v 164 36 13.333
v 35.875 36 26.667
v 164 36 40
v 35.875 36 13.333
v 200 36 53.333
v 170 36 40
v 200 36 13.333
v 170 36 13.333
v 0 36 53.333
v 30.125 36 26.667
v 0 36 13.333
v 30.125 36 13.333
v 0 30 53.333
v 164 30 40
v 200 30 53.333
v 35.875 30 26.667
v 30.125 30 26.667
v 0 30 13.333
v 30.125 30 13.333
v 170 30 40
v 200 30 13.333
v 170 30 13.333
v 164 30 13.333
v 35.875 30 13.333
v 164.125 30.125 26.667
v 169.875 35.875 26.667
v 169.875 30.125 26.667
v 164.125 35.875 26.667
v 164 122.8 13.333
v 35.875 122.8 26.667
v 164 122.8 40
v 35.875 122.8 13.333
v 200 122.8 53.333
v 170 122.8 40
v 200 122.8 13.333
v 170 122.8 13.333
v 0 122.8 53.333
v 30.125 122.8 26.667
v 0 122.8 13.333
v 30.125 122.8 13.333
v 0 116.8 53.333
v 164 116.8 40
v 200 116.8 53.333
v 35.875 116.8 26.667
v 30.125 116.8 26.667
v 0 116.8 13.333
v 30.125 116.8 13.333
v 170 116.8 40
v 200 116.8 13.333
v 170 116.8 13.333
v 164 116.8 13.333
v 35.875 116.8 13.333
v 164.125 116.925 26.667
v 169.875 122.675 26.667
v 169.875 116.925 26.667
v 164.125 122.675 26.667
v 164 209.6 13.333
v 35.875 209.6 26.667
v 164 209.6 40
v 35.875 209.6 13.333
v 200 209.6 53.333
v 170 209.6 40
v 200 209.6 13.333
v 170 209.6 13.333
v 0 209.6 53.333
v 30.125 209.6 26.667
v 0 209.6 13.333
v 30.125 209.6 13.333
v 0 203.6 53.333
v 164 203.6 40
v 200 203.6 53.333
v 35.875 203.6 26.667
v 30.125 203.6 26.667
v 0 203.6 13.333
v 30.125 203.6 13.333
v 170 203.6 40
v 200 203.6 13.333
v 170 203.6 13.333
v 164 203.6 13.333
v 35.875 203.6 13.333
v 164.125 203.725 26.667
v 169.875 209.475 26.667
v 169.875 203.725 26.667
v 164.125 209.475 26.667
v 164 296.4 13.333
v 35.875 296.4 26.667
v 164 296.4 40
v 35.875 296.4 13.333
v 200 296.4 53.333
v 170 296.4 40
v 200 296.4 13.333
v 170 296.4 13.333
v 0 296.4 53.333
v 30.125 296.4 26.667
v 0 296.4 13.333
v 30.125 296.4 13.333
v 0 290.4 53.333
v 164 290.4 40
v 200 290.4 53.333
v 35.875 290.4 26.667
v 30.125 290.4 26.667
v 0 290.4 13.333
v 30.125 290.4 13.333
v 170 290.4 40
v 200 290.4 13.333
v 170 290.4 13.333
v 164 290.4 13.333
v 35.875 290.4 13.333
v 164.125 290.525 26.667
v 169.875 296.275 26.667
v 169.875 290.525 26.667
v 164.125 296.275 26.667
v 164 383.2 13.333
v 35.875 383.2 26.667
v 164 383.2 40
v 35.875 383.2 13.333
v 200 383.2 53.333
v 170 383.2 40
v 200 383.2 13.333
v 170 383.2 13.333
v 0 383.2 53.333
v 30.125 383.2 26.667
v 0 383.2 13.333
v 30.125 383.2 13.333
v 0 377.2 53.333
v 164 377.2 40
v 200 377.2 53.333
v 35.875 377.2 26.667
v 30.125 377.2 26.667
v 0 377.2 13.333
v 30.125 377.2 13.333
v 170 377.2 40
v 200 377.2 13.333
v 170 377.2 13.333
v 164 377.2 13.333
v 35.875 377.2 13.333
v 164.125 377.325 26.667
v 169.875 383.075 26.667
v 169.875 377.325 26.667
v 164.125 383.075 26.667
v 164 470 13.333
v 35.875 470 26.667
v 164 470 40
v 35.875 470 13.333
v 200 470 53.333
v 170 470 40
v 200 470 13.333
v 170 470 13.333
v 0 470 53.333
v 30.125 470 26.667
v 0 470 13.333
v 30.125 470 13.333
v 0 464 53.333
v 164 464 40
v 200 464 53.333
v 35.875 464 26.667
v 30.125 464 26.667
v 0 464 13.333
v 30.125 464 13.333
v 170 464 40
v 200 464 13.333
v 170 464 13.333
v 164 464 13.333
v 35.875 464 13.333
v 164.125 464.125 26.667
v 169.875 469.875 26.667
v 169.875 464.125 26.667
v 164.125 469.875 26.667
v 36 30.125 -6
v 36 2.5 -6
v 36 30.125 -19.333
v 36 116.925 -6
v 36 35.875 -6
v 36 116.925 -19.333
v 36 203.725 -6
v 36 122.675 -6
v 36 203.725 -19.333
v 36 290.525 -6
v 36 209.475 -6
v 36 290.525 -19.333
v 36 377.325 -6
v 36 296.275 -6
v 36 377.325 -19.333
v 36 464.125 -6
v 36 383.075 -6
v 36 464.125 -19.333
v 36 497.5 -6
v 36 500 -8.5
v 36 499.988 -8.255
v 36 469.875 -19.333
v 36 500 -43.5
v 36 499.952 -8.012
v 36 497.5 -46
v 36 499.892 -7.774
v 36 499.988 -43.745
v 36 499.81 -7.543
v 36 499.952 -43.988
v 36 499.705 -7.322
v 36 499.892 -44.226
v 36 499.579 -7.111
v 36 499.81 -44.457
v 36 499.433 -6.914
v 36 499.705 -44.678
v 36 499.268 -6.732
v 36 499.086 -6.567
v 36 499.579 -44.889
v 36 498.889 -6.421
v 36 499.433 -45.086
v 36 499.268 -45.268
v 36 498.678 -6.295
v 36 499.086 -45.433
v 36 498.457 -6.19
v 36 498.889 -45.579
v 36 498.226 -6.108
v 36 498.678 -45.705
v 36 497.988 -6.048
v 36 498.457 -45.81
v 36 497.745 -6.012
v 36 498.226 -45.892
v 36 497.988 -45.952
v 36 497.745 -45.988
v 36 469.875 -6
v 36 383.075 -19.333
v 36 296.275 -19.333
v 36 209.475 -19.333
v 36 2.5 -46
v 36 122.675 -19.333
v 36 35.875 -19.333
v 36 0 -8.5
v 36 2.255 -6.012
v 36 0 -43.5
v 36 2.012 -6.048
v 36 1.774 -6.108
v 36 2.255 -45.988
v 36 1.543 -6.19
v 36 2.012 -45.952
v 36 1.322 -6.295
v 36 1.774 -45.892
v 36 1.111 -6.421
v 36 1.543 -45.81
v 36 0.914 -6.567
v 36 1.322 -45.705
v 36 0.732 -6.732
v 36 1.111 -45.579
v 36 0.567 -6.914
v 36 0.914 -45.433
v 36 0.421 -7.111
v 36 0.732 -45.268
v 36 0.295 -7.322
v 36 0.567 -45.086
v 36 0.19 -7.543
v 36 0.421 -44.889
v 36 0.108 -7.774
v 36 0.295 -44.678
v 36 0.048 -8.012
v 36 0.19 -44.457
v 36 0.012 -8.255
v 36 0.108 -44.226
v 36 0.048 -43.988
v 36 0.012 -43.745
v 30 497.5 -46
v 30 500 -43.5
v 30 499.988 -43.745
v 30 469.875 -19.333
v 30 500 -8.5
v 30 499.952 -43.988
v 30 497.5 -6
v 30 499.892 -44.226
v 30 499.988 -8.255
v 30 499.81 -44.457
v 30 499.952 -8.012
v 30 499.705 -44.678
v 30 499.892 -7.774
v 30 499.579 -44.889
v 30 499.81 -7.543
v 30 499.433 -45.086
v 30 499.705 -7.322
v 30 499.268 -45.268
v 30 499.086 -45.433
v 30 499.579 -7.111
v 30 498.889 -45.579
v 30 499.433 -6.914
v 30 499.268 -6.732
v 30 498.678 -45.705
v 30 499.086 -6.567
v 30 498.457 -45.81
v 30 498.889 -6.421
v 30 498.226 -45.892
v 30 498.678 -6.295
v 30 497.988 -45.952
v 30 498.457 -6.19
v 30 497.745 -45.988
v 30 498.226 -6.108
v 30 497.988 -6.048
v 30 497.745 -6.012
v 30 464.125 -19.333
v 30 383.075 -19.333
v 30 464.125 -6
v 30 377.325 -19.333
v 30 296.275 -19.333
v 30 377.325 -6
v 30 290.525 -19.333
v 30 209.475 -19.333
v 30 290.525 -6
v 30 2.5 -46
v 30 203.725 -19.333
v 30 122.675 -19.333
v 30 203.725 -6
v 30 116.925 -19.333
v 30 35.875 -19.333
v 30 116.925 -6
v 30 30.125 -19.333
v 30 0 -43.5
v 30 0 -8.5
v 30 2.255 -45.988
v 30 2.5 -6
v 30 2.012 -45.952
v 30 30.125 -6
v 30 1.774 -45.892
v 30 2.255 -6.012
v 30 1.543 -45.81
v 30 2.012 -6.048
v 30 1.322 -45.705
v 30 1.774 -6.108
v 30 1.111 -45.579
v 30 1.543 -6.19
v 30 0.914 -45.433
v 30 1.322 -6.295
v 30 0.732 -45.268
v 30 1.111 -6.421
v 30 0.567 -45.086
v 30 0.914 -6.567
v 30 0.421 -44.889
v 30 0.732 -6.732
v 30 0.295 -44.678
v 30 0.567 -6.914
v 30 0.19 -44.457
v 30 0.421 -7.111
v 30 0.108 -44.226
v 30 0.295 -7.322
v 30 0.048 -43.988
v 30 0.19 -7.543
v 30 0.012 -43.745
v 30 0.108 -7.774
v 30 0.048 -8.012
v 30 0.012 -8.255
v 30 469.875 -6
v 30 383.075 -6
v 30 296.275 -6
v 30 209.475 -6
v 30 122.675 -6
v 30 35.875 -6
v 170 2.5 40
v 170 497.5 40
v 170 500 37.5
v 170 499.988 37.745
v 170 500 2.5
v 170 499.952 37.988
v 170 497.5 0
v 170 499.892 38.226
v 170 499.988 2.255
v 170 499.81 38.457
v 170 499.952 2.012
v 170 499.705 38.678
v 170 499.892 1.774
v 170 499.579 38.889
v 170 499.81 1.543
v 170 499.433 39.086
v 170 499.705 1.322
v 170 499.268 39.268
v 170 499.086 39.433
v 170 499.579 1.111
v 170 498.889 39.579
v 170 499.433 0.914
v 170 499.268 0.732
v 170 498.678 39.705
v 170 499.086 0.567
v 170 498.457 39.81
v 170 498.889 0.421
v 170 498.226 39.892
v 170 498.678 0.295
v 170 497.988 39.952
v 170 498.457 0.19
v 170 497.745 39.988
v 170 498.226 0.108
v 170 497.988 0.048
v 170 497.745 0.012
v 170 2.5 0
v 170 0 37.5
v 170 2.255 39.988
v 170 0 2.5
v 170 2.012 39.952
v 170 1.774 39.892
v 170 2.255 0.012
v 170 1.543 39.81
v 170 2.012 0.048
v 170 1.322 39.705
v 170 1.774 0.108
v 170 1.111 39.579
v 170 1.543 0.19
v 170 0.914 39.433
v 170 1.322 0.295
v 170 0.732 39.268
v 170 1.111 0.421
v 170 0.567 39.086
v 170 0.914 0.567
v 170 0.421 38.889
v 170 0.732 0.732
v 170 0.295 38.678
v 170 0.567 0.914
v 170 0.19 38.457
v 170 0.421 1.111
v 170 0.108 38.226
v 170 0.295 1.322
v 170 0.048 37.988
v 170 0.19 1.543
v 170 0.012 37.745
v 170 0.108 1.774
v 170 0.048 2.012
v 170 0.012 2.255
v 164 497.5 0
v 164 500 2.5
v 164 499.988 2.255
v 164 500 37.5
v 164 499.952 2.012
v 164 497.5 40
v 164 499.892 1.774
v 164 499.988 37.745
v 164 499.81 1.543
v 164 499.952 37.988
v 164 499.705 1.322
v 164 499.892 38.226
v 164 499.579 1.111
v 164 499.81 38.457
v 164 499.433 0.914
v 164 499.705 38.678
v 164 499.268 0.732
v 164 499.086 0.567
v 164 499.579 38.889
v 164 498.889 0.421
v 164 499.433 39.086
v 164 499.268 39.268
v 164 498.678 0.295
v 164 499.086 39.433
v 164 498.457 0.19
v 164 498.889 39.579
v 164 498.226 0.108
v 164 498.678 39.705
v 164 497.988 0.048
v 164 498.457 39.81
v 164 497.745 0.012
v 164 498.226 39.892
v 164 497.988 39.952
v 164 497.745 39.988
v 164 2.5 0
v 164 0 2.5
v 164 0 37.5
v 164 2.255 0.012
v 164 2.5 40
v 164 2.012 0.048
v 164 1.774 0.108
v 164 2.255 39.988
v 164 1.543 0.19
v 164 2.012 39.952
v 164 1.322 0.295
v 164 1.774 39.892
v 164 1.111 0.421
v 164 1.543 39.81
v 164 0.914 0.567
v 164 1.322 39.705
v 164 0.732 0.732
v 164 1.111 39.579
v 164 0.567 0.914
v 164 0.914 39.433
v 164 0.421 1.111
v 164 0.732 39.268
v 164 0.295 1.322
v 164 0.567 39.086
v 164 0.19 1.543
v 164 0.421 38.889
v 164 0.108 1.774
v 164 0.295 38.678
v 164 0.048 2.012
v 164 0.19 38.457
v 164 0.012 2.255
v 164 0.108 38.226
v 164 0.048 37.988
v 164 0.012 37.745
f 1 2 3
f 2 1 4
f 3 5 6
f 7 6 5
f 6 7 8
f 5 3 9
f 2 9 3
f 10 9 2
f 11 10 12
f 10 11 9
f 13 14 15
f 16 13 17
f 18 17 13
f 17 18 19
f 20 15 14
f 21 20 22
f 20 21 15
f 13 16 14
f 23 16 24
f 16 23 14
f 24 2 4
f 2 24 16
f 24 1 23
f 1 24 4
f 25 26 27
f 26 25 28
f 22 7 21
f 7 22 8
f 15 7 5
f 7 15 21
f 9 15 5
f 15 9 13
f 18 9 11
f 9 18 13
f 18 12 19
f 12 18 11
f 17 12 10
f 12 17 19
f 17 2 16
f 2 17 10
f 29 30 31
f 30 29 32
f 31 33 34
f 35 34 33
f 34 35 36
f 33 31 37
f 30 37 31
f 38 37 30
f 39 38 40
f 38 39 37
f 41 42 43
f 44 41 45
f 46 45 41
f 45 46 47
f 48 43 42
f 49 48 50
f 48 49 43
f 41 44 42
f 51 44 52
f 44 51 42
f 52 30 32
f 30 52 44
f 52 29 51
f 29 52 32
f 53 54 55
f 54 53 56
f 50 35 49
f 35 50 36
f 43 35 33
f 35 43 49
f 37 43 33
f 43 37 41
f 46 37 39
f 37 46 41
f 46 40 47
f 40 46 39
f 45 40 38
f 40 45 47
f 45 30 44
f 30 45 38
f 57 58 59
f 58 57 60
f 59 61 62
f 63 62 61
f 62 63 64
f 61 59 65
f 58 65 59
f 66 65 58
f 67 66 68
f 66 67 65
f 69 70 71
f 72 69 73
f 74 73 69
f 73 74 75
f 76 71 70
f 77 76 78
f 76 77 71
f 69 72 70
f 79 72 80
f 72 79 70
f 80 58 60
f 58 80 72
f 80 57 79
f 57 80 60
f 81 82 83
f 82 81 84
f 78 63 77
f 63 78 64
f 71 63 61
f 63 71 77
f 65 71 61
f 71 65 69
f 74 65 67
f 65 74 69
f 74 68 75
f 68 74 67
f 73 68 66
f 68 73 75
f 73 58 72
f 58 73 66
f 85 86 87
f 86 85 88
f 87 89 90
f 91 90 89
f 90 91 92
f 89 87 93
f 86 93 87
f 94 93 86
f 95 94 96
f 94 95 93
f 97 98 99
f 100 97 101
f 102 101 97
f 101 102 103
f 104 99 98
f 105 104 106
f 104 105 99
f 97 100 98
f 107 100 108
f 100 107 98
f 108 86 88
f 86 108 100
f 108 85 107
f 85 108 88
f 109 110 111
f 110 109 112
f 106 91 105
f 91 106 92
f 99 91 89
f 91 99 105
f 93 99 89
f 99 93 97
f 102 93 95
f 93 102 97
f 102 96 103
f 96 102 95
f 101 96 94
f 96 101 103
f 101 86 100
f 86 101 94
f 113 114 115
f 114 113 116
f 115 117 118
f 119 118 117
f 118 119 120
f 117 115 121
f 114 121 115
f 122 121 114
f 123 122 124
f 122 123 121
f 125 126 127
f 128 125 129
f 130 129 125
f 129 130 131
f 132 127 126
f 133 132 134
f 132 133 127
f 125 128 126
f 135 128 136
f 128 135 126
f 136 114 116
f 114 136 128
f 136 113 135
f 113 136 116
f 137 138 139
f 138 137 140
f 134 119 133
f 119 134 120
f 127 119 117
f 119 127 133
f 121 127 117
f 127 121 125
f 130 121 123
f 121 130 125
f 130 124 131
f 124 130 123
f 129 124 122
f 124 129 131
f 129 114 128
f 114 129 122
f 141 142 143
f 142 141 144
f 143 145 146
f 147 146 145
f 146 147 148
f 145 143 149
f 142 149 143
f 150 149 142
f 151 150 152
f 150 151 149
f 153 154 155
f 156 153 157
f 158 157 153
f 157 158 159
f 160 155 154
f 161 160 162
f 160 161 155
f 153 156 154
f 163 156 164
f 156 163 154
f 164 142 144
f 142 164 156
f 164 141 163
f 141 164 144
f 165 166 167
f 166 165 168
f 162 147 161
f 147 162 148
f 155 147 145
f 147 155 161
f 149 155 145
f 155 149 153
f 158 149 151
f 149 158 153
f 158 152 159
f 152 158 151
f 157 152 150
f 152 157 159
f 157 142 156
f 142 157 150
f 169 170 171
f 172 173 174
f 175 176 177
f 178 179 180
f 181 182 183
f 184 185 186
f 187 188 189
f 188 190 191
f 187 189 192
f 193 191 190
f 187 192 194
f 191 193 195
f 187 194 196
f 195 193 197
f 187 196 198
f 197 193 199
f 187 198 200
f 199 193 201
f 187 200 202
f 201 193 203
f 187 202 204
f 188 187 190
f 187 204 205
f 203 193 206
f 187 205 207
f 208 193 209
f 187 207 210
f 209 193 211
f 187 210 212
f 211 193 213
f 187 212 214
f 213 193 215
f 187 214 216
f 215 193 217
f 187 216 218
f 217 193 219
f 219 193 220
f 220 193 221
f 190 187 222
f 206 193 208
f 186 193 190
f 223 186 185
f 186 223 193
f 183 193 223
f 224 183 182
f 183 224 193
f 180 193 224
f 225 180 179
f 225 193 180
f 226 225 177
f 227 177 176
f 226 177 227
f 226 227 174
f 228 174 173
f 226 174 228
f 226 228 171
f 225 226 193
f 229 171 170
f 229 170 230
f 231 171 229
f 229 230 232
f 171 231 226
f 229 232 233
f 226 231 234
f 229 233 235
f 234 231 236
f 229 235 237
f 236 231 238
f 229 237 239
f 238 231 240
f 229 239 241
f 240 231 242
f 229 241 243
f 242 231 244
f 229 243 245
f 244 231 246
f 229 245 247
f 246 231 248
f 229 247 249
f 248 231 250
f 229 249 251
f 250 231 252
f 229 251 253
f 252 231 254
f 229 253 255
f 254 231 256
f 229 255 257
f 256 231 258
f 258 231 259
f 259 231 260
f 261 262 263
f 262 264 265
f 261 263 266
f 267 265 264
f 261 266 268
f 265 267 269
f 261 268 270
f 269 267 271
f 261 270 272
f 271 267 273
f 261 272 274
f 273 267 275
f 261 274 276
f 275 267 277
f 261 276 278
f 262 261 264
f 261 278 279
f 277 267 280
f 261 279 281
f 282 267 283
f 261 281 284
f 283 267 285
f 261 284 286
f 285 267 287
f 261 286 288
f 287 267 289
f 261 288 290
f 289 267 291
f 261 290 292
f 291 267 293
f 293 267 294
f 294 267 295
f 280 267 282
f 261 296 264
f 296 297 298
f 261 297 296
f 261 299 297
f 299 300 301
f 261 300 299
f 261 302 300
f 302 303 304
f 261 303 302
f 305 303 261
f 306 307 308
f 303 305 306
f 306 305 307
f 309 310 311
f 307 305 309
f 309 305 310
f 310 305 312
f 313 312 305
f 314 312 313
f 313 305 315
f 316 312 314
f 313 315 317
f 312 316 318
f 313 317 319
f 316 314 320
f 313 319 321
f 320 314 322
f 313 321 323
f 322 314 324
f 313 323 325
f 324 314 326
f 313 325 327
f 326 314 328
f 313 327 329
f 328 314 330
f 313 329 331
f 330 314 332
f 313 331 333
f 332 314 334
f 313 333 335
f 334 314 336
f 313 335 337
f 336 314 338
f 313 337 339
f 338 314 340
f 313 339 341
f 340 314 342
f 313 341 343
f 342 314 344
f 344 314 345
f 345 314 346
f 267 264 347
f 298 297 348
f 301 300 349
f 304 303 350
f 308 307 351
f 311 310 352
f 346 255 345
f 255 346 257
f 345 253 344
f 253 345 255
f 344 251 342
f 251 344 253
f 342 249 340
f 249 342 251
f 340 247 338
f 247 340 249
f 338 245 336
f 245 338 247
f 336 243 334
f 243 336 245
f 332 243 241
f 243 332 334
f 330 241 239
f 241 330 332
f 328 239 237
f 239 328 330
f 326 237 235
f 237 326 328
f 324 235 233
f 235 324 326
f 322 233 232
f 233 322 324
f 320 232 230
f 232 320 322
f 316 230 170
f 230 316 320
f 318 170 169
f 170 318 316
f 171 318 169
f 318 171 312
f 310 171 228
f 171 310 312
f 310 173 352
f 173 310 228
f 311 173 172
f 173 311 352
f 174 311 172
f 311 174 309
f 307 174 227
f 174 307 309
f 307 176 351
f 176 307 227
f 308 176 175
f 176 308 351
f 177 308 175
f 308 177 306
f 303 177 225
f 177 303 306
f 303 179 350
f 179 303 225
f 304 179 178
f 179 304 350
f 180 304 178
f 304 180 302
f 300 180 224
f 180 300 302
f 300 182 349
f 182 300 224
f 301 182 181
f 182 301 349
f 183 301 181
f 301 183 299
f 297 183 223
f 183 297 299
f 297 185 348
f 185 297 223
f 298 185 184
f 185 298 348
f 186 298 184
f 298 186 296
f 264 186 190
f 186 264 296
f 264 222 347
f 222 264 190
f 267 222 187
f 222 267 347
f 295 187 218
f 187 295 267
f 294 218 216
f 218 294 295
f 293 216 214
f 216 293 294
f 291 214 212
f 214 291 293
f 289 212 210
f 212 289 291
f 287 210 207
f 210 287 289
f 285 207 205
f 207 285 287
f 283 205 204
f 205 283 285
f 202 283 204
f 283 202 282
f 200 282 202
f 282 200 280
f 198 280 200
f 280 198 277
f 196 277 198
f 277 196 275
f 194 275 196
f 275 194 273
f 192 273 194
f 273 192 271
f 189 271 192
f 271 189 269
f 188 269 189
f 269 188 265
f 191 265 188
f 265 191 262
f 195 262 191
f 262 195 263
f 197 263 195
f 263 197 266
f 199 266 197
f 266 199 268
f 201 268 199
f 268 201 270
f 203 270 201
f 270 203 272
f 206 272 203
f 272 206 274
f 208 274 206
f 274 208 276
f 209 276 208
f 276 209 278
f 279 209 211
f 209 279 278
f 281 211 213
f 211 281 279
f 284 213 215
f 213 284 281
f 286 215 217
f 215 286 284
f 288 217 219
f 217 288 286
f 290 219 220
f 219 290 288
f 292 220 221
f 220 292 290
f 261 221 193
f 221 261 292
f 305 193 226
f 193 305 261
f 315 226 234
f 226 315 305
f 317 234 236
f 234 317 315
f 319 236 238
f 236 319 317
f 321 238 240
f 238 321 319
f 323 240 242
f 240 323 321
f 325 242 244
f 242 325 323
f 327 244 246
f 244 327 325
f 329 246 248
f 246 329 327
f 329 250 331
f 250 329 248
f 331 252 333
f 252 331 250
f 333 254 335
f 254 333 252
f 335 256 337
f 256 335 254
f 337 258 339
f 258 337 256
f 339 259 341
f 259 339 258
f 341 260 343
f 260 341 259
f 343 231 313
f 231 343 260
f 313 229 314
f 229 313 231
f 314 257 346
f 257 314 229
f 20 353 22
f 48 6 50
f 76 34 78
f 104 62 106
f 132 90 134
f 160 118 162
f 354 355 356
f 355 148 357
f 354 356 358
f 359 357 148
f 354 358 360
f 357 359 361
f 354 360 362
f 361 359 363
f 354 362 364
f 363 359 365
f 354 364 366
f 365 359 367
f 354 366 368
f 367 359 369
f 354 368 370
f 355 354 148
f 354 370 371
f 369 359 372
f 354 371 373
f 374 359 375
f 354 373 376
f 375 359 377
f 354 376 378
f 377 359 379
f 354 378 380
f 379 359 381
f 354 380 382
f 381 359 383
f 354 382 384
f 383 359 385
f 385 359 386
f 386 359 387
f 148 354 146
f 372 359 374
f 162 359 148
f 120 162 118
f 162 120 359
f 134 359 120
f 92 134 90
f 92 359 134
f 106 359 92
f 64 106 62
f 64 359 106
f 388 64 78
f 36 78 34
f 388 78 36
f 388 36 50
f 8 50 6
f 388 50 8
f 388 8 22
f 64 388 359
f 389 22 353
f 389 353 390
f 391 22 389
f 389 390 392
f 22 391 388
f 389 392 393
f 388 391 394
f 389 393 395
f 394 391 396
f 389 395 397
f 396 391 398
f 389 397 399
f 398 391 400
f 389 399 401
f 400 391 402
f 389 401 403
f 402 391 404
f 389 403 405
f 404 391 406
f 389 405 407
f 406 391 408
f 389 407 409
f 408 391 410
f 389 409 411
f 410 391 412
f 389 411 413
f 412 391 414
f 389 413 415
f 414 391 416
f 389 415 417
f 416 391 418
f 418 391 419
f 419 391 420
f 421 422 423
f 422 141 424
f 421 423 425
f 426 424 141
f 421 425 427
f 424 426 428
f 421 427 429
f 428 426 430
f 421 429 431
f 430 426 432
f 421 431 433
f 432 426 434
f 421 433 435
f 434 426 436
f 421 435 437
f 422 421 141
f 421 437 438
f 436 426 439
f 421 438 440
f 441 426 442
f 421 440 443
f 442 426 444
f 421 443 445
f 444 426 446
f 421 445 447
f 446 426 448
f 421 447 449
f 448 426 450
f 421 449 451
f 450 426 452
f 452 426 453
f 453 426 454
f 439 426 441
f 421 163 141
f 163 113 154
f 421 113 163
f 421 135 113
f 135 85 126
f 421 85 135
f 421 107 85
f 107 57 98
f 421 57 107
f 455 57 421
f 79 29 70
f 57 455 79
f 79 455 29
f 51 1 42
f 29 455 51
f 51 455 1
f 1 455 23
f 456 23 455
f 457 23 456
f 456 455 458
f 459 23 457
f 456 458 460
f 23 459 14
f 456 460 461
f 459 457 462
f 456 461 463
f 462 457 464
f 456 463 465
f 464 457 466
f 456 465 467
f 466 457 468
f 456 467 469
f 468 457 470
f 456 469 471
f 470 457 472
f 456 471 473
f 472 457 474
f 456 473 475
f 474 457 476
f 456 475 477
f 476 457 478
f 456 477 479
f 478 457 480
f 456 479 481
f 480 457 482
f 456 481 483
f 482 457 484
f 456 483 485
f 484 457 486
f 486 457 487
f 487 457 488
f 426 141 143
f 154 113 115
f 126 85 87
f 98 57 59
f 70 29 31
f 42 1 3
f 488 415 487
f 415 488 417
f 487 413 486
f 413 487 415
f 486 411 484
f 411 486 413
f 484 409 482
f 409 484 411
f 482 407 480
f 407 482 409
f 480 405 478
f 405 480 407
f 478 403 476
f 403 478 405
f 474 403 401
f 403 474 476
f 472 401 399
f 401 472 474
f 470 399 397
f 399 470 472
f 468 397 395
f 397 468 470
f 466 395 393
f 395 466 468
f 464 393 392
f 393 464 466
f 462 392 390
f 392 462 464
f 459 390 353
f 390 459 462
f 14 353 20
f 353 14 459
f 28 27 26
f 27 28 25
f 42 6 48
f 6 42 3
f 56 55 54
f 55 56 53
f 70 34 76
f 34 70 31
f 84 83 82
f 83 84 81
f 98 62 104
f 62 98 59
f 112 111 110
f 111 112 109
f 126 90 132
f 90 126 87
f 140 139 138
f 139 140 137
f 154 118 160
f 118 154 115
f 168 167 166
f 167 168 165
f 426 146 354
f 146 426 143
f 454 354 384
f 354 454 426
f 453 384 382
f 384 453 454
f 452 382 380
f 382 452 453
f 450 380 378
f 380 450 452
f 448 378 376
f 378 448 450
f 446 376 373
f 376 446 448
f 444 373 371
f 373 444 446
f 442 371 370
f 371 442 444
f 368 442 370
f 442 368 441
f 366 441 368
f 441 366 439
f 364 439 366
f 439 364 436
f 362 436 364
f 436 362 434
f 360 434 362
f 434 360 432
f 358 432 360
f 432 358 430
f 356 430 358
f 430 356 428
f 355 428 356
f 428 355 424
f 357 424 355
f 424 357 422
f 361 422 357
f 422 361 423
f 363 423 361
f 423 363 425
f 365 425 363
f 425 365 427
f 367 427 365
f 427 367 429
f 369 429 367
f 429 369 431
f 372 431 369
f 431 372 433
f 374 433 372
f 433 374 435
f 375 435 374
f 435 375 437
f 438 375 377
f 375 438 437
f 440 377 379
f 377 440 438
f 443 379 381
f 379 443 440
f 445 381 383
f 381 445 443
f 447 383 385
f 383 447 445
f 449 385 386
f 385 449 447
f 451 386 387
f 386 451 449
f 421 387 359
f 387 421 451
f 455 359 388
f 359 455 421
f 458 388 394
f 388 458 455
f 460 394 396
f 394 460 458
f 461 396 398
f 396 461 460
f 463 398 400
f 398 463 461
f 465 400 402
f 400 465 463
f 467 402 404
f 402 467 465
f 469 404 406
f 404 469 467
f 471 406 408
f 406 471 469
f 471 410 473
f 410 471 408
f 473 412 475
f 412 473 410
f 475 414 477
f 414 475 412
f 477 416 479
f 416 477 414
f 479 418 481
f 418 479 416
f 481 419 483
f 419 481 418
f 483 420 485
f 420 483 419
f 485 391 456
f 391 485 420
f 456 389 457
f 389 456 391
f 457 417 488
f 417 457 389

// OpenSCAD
width = 200;
length = 500;
height = 40;

//materialstärke
th = 6;

// Anzahl Querverbindungen
anz = 6;

// Abstand Überkreuzung
margin = 30;

// Toleranzkorrektur
tol = 0.25; 

// Radius für Rundung
rad = 5;


// Schnitttiefe. zB.: height/2
cutDepth = height/3;

// Vorschau
!preview();

// Schnittansicht
renderview();


// Testück
test();




// ===========================================================
$fn = 64;
red = [1,0,0];
green = [0,1,0];
blue = [0,0,1];

module renderview(){
    lang();
    t(height*2+th)r(0,0,90)sub();
}

module preview(){
   t(0,0,-height-th)color(red)t(th+margin)r(0,-90)extr()lang();
   color(red)t(width-margin)r(0,-90)extr()lang();
   color(green)t(0,0,height-cutDepth*2)loop()r(90)extr()sub();    
}

module test(){
    difference(){
        square([height,height]);
        #t(height/2-th/2+tol/2)square([th-tol, cutDepth]);
        
    }
}

module lang(){
    difference(){
        roundedSquare(height, length, rad);
        loop()t(height-cutDepth,-th+tol/2)square([cutDepth, th-tol]);
    }
}

module sub(){
    difference(){
        square([width, height]);
        t(margin+tol/2)square([th-tol, cutDepth]);
        t(width-margin-th+tol/2)square([th-tol, cutDepth]);
    }   
}


module loop(){
    for(n=[0:1:anz-1]){
        t(0,margin+th+n*(length-th-margin*2)/(anz-1),0)children();
    }
}

module extr(){
    linear_extrude(th)children();
}

module t(x=0,y=0,z=0){
    translate([x,y,z])children();
}

module r(x=0,y=0,z=0){
    rotate([x,y,z])children();
}


module roundedSquare(w,l,rad){
    hull(){
        t(rad/2,rad/2)circle(d=rad);
        t(w-rad/2,rad/2)circle(d=rad);
        t(rad/2,l-rad/2)circle(d=rad);
        t(w-rad/2,l-rad/2)circle(d=rad);
    }
}
